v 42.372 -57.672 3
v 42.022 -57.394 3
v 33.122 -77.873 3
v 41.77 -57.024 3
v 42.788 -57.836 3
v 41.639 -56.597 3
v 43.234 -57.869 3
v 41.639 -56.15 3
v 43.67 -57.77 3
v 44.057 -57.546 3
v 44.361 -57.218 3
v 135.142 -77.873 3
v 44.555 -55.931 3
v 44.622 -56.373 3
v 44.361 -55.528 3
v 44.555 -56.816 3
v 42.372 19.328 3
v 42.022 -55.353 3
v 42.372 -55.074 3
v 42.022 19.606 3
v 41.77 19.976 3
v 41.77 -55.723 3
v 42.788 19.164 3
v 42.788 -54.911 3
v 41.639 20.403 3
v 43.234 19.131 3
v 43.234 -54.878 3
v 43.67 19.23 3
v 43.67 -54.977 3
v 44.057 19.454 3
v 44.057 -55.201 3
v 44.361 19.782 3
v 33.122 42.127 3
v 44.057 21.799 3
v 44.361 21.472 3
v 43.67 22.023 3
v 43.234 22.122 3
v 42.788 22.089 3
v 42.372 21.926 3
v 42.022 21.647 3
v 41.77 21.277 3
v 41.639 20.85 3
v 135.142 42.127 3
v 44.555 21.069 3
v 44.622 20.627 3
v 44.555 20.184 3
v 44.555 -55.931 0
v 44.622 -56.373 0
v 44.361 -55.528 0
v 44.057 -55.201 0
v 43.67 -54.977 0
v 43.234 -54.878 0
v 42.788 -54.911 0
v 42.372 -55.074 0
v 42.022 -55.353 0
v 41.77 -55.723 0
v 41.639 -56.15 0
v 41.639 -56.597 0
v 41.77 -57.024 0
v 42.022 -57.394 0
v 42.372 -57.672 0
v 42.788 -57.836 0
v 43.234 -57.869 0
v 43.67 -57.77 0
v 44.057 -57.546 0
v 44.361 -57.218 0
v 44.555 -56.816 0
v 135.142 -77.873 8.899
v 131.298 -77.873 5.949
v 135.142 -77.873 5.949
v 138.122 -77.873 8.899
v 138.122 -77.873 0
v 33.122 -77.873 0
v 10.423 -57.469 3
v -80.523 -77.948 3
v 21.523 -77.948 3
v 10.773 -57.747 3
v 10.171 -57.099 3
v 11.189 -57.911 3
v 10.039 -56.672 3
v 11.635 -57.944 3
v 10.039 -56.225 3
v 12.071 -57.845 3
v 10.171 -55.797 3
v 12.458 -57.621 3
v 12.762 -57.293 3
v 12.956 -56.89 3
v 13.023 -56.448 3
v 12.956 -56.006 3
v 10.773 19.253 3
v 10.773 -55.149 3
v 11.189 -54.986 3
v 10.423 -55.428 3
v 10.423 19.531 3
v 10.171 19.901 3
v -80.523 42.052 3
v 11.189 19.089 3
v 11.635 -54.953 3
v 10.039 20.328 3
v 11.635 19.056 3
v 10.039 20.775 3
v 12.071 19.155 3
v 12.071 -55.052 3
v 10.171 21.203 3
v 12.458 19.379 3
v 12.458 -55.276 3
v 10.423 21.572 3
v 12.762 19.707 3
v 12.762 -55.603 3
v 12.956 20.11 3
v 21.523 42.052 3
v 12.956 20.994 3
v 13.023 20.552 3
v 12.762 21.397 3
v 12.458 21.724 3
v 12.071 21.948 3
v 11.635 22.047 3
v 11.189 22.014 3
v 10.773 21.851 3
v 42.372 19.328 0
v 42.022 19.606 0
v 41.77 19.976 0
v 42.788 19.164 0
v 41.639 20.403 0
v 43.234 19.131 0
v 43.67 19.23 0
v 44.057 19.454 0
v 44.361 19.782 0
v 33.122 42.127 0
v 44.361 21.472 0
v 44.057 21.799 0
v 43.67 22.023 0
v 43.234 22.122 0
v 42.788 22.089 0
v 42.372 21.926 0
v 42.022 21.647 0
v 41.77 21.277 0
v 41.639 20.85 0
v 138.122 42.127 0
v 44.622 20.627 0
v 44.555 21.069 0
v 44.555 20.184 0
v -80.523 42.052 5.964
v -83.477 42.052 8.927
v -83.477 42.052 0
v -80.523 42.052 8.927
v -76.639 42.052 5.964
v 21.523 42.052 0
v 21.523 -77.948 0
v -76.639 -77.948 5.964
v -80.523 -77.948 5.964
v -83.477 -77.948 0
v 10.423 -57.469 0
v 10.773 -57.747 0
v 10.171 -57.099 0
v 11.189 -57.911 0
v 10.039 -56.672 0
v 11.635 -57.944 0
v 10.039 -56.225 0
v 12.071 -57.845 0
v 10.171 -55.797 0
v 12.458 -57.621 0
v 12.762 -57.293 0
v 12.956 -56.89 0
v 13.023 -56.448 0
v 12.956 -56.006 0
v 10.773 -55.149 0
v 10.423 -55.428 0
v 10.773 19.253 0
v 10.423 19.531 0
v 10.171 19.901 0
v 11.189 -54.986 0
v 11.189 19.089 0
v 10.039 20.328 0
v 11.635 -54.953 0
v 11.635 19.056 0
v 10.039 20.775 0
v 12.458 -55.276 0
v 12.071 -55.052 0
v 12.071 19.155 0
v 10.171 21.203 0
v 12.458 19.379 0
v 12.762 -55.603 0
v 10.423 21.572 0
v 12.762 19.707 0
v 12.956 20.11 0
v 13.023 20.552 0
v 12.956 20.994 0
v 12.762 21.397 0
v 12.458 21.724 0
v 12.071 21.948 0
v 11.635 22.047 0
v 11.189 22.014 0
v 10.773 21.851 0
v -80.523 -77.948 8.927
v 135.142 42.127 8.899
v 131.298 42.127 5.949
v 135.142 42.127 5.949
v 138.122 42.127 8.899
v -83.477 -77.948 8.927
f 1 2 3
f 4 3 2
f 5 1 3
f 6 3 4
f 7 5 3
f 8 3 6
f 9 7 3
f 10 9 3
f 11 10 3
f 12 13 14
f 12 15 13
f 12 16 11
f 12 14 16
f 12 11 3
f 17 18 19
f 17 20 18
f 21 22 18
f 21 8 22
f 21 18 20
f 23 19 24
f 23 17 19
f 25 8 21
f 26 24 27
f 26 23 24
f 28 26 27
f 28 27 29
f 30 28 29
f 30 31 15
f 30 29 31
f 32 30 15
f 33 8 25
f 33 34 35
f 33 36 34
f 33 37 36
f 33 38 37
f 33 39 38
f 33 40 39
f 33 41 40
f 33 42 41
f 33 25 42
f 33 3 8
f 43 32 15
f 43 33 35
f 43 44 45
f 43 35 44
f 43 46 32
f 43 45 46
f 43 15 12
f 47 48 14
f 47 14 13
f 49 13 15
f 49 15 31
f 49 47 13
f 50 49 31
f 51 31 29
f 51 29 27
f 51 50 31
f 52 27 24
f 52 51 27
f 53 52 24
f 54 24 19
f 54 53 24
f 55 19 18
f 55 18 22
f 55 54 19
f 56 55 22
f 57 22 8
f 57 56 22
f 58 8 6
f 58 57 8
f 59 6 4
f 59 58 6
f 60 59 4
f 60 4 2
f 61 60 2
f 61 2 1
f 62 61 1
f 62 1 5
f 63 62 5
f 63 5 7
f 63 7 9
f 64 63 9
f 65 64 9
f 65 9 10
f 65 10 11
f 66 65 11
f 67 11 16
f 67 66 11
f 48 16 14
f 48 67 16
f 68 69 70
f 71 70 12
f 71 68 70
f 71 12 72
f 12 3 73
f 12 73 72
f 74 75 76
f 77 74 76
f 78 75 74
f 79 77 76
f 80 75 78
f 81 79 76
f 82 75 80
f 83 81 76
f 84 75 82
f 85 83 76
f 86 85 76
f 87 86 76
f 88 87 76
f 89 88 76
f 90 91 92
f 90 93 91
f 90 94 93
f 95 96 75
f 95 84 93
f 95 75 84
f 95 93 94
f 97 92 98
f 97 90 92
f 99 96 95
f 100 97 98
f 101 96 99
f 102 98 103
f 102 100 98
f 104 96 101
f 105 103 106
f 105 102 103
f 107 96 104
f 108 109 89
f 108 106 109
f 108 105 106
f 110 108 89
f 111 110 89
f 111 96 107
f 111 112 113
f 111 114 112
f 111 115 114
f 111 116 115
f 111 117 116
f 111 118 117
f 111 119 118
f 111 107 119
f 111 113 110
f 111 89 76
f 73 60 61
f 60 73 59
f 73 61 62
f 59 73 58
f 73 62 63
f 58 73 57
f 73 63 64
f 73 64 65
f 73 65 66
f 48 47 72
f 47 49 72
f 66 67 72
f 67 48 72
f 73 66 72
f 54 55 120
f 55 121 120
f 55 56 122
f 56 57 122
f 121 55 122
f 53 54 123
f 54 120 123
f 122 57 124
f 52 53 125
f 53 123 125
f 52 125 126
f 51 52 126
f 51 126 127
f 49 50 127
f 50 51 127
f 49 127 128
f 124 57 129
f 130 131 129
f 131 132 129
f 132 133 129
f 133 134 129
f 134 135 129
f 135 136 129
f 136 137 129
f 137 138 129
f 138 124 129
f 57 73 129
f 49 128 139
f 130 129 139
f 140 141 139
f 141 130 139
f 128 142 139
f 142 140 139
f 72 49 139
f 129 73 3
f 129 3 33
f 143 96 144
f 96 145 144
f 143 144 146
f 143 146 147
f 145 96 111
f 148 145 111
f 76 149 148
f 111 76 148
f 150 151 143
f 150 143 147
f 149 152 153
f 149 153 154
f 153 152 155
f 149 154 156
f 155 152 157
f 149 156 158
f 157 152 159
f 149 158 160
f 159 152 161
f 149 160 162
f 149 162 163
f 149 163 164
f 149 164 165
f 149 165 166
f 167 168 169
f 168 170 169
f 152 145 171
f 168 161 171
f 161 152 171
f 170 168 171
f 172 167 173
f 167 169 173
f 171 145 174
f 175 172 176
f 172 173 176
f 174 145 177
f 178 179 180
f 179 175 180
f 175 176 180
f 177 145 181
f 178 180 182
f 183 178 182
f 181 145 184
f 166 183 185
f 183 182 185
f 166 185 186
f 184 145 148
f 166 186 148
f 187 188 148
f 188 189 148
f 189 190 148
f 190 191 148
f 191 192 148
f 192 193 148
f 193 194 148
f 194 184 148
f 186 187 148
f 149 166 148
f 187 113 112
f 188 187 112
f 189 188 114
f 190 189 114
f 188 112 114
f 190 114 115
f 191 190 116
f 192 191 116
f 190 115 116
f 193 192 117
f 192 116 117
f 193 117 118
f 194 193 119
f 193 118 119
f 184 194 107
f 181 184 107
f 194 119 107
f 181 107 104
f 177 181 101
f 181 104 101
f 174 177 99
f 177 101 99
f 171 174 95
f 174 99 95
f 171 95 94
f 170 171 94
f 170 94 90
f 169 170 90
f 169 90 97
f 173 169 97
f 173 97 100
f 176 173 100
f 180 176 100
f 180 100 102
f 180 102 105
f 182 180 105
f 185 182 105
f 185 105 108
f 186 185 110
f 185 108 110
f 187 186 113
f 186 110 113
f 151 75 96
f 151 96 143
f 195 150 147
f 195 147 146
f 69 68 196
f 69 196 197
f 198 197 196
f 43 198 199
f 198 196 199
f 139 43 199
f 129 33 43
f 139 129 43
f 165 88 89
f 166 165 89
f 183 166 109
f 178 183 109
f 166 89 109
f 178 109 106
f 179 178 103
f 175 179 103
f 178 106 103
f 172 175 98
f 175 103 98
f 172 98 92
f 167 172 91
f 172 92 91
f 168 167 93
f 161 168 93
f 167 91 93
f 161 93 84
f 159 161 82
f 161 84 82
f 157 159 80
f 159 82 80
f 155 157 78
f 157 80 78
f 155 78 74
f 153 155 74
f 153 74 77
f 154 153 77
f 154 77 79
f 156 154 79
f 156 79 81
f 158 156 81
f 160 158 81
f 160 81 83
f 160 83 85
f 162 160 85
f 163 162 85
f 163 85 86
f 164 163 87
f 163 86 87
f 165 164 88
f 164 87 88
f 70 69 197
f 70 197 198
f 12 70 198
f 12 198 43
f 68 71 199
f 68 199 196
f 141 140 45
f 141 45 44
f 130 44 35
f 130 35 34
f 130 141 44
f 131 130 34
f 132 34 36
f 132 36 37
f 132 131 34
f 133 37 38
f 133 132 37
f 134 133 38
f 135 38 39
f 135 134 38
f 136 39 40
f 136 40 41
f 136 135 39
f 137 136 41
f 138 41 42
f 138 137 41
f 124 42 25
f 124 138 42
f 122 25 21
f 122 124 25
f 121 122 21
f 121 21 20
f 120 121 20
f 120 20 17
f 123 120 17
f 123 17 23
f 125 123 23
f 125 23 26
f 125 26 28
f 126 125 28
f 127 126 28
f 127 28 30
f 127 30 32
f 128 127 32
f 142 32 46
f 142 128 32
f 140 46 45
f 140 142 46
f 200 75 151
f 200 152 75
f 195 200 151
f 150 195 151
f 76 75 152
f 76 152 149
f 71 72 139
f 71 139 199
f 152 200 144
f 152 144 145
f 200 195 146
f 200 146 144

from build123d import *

# Parameters (mm, degrees)
F0_W      = 105
F0_H      = 120
F1_DEPTH  = 3
F2_R      = 1.5
F3_DEPTH  = 3
F5_DEPTH  = 120
F6_W      = 105
F6_H      = 120
F8_DEPTH  = 3
F7_R      = 1.5
F9_DEPTH  = 3
F11_DEPTH = 120


with BuildPart() as f1:
    # F0 (on Top) → F1 (new body)
    with BuildSketch(Plane.XY):
        with Locations((-30.977487, -17.948309)):
            Rectangle(F0_W, F0_H)
    extrude(amount=F1_DEPTH)

    # F2 (on face) → F3 (cut, through all)
    with BuildSketch(Plane.XY.offset(3)):
        with Locations((11.522513, 20.551691)):
            Circle(F2_R)
        with Locations((11.522513, -56.448309)):
            Circle(F2_R)
    extrude(amount=-F3_DEPTH, mode=Mode.SUBTRACT)

    # F4 (on face) → F5 (join, through all)
    with BuildSketch(Plane.XZ.offset(77.948309)):
        Polygon((-83.477487, 8.927221), (-83.477487, 3), (-80.523066, 3), (-80.523066, 5.963611), (-76.639466, 5.963611), (-80.523066, 8.927221), align=None)
    extrude(amount=-F5_DEPTH)


with BuildPart() as f8:
    # F6 (on Top) → F8 (new body)
    with BuildSketch(Plane.XY):
        with Locations((85.621953, -17.873387)):
            Rectangle(F6_W, F6_H)
    extrude(amount=F8_DEPTH)

    # F7 (on face) → F9 (cut, through all)
    with BuildSketch(Plane.XY):
        with Locations((43.121953, 20.626613)):
            Circle(F7_R)
        with Locations((43.121953, -56.373387)):
            Circle(F7_R)
    extrude(amount=F9_DEPTH, mode=Mode.SUBTRACT)

    # F10 (on face) → F11 (join, through all)
    with BuildSketch(Plane.XZ.offset(77.873387)):
        Polygon((135.142416, 3), (138.121953, 3), (138.121953, 8.898546), (135.142416, 8.898546), (131.297857, 5.949273), (135.142416, 5.949273), align=None)
    extrude(amount=-F11_DEPTH)


solid = Compound([f1.part, f8.part])
